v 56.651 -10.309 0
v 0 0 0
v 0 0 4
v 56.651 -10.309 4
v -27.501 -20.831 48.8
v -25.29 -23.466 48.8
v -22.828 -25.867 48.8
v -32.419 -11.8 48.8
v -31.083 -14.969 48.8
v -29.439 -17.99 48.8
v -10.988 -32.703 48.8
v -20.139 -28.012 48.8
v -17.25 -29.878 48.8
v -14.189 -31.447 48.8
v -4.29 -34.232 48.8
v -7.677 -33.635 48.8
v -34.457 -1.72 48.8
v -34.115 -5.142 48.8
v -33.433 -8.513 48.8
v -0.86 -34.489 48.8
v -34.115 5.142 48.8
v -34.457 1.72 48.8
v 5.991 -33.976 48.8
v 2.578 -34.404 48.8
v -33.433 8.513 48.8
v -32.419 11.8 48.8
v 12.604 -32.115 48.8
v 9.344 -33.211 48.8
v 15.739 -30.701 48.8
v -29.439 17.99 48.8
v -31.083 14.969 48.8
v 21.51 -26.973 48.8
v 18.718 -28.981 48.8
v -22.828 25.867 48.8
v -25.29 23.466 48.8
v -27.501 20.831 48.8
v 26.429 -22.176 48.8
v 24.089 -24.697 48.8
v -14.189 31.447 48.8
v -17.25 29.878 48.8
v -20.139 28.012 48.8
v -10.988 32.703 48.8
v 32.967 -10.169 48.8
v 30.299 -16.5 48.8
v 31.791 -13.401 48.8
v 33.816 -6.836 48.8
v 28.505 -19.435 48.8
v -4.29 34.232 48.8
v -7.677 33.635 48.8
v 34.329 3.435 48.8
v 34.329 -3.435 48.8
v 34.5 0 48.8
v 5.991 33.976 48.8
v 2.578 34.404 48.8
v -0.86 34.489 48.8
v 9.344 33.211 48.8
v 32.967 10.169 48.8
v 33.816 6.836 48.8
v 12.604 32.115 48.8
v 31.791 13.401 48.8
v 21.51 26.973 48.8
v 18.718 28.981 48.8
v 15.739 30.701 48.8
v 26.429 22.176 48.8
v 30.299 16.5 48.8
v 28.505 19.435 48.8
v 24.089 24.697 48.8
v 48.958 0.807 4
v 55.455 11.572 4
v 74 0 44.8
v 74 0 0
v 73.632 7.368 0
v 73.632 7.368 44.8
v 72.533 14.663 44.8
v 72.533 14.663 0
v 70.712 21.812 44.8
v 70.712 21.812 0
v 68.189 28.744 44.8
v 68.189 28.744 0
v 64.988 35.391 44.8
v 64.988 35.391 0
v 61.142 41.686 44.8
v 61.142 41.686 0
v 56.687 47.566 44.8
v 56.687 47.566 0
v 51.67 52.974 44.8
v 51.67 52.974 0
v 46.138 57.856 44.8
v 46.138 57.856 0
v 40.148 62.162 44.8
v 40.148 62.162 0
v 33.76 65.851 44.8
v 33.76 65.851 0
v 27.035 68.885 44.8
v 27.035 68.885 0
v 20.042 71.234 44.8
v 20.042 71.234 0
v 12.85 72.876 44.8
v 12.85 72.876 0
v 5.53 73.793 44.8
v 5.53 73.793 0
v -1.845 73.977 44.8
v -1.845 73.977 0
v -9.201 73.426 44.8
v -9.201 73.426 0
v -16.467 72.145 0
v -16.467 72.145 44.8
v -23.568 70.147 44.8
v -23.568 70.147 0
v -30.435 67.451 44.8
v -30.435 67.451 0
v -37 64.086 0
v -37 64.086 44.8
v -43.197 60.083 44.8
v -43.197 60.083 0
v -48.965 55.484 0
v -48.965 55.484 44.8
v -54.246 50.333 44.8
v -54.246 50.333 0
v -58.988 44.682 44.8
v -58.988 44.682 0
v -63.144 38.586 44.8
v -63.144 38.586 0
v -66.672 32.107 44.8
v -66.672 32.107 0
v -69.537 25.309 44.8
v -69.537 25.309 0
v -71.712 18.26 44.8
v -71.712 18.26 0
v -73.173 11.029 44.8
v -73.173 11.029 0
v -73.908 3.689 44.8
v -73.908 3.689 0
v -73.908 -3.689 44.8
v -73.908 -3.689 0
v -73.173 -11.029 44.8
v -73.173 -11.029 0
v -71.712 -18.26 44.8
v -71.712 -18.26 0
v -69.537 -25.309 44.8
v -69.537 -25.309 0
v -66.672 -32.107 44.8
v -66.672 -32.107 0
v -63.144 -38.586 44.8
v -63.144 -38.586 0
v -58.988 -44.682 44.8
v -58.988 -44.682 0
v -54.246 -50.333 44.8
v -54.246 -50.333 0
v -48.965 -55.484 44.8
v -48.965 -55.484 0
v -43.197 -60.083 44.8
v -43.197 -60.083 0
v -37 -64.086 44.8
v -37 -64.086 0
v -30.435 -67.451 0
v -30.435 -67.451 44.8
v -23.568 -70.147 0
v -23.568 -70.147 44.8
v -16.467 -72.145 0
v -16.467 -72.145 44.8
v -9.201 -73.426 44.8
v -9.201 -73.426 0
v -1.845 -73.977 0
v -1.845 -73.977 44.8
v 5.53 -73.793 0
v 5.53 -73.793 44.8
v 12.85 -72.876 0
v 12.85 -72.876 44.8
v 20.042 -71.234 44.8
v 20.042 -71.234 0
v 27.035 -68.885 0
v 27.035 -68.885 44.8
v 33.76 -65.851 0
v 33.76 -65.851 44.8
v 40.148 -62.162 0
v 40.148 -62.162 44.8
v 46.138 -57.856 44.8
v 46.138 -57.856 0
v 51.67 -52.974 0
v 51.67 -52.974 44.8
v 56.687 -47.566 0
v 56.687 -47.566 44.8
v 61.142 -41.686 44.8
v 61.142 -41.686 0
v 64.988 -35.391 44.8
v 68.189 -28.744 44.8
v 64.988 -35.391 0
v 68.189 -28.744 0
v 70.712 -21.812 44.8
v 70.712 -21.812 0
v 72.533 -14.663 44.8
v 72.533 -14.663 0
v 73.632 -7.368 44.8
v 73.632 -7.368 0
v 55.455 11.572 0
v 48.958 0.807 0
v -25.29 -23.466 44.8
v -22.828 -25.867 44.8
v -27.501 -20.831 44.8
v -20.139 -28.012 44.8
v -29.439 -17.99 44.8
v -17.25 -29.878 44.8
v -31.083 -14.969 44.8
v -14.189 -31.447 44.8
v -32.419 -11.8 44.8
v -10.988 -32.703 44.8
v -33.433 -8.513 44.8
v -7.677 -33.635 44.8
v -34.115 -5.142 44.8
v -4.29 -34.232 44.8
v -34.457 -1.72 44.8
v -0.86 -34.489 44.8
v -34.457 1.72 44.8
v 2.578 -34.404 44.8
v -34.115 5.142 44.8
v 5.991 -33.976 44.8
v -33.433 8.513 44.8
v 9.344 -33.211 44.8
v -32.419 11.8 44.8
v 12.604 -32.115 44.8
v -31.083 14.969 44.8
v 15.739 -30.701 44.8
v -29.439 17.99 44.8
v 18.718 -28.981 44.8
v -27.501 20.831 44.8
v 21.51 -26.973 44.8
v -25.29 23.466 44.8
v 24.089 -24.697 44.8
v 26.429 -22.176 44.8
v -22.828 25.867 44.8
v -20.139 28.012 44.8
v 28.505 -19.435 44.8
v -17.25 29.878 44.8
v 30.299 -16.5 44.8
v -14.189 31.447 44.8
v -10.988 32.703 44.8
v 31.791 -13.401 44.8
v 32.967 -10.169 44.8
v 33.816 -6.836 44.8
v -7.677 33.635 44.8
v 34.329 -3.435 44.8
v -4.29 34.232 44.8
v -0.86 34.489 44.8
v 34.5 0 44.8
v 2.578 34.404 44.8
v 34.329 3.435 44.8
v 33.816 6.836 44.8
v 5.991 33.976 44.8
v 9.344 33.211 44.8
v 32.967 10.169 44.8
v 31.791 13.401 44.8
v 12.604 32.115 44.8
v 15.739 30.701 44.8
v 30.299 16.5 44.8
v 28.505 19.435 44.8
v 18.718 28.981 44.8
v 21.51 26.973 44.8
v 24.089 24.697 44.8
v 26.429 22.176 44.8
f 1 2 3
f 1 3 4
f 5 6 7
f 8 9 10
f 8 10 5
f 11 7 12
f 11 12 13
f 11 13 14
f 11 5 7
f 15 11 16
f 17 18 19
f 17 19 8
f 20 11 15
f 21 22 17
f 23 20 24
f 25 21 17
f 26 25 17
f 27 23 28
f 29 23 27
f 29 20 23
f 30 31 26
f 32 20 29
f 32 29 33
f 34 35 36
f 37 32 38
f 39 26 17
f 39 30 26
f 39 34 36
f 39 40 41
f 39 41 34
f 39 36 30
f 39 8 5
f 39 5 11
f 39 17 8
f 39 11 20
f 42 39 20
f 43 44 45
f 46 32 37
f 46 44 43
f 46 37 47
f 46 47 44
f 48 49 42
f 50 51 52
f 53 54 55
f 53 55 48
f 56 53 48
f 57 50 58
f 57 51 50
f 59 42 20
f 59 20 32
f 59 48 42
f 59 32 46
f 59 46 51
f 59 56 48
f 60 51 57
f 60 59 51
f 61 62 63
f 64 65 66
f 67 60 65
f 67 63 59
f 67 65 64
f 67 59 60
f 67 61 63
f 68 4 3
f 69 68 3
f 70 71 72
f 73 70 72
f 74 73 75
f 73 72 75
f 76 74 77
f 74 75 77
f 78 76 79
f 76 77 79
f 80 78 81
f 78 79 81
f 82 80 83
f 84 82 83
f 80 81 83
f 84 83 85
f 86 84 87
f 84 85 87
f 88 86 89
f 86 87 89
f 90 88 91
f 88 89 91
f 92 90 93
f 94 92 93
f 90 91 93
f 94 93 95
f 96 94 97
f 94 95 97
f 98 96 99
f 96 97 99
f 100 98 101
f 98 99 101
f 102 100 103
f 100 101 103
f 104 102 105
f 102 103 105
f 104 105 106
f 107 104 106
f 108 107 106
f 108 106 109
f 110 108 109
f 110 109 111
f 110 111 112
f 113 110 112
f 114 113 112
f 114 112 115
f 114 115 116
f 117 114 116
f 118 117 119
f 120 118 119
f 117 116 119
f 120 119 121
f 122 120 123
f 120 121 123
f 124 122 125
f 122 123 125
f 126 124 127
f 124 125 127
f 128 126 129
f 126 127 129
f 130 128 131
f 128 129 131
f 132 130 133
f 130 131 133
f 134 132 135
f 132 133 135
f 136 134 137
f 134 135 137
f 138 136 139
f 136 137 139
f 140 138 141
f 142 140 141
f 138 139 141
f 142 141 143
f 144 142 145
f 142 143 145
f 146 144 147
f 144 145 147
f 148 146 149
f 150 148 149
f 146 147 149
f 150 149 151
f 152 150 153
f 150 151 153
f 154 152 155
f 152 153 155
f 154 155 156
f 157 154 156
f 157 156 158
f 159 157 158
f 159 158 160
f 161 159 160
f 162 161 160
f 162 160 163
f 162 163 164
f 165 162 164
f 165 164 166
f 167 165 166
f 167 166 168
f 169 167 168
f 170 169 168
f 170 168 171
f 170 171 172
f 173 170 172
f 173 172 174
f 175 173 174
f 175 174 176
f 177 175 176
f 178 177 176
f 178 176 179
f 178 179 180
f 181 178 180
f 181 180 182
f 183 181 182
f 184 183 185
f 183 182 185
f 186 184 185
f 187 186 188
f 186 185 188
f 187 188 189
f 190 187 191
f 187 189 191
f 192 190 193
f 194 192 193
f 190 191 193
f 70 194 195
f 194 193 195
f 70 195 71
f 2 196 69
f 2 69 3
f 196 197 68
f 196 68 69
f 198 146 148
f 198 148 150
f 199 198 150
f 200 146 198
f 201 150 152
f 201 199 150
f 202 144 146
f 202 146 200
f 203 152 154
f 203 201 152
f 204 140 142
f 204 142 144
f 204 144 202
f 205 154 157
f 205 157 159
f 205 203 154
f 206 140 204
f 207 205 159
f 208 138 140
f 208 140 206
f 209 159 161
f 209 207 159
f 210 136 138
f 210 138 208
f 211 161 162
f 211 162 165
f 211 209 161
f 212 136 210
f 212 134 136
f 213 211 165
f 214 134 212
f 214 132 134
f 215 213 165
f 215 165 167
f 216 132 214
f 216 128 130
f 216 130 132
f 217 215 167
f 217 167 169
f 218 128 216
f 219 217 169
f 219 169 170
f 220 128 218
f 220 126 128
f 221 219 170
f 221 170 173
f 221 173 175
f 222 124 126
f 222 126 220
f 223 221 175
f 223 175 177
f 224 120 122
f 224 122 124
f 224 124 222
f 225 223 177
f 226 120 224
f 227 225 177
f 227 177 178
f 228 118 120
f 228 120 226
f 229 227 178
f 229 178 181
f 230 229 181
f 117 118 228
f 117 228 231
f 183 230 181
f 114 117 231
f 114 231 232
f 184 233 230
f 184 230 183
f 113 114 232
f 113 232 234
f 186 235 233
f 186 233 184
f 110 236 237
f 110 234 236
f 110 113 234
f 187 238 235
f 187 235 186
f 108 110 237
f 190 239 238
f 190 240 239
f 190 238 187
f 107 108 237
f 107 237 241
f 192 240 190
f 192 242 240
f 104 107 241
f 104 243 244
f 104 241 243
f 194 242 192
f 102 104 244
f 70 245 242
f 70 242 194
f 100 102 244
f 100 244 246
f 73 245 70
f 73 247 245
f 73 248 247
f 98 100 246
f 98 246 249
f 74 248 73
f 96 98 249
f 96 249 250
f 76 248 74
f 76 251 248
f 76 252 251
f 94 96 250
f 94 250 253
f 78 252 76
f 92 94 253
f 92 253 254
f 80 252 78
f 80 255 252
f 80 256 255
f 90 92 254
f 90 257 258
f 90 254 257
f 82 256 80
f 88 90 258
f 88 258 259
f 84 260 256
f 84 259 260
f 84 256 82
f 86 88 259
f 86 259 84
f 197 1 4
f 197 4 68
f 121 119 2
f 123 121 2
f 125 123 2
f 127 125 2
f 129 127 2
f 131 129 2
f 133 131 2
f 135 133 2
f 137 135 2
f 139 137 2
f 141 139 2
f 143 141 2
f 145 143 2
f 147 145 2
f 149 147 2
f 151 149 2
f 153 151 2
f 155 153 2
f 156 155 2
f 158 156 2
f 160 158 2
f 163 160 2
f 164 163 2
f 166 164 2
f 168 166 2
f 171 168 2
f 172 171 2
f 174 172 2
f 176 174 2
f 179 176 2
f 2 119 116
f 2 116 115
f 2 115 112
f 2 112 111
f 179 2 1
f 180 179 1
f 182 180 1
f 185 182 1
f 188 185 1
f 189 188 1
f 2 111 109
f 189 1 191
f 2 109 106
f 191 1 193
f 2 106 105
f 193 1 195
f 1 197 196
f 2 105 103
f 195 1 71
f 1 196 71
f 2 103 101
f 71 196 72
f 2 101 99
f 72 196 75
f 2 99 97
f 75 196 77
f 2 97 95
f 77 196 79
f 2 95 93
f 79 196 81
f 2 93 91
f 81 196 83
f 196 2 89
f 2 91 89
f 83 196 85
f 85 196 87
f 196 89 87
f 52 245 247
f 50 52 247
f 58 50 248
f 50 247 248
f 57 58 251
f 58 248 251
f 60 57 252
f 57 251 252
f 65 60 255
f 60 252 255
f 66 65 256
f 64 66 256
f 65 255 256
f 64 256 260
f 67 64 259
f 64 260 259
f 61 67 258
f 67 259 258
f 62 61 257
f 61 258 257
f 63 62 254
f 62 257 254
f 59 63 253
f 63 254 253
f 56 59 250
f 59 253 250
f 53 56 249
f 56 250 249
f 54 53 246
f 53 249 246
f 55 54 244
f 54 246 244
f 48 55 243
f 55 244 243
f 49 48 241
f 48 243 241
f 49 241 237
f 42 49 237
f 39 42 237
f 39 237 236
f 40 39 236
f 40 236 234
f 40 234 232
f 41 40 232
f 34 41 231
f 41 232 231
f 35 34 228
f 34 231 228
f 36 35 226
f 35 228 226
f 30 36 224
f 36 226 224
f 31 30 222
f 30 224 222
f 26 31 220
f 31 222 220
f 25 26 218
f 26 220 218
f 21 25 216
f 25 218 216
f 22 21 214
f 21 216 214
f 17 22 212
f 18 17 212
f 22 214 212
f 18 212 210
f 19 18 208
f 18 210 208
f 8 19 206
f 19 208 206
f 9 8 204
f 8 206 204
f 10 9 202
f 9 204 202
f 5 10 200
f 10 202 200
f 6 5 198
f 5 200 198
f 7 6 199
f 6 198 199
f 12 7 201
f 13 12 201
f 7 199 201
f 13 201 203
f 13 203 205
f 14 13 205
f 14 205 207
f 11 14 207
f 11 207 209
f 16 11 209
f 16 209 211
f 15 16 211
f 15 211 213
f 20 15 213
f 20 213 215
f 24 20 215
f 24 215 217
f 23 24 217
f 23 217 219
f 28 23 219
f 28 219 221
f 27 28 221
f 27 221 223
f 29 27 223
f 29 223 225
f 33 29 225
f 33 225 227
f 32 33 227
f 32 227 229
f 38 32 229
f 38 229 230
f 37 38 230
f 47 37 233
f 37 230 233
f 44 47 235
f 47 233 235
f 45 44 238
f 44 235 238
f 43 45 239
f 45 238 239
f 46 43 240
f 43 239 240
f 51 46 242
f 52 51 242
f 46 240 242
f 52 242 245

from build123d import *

# Parameters (mm, degrees)
SKETCH_1_R          = 74
EXTRUDE_1_DEPTH     = 44.8
SKETCH_3_R          = 34.5
EXTRUDE_2_DEPTH     = 4
CUT_EXTRUDE_3_DEPTH = 4


with BuildPart() as part:
    # 草图1 → 凸台-拉伸1 (new body)
    with BuildSketch(Plane.XY):
        Circle(SKETCH_1_R)
    extrude(amount=EXTRUDE_1_DEPTH)

    # 草图3 → 凸台-拉伸2 (add)
    with BuildSketch(Plane.XY.offset(44.8)):
        Circle(SKETCH_3_R)
    extrude(amount=EXTRUDE_2_DEPTH)

    # 草图4 → 切除-拉伸3 (cut)
    with BuildSketch(Plane(origin=(0, 0, 0), x_dir=(1, 0, 0), z_dir=(0, 0, -1))):
        Polygon((55.454566514, -11.572321894), (0, 0), (56.650713471, 10.308727493), (48.957646125, -0.806969816), align=None)
    extrude(amount=-CUT_EXTRUDE_3_DEPTH, mode=Mode.SUBTRACT)


solid = part.part
